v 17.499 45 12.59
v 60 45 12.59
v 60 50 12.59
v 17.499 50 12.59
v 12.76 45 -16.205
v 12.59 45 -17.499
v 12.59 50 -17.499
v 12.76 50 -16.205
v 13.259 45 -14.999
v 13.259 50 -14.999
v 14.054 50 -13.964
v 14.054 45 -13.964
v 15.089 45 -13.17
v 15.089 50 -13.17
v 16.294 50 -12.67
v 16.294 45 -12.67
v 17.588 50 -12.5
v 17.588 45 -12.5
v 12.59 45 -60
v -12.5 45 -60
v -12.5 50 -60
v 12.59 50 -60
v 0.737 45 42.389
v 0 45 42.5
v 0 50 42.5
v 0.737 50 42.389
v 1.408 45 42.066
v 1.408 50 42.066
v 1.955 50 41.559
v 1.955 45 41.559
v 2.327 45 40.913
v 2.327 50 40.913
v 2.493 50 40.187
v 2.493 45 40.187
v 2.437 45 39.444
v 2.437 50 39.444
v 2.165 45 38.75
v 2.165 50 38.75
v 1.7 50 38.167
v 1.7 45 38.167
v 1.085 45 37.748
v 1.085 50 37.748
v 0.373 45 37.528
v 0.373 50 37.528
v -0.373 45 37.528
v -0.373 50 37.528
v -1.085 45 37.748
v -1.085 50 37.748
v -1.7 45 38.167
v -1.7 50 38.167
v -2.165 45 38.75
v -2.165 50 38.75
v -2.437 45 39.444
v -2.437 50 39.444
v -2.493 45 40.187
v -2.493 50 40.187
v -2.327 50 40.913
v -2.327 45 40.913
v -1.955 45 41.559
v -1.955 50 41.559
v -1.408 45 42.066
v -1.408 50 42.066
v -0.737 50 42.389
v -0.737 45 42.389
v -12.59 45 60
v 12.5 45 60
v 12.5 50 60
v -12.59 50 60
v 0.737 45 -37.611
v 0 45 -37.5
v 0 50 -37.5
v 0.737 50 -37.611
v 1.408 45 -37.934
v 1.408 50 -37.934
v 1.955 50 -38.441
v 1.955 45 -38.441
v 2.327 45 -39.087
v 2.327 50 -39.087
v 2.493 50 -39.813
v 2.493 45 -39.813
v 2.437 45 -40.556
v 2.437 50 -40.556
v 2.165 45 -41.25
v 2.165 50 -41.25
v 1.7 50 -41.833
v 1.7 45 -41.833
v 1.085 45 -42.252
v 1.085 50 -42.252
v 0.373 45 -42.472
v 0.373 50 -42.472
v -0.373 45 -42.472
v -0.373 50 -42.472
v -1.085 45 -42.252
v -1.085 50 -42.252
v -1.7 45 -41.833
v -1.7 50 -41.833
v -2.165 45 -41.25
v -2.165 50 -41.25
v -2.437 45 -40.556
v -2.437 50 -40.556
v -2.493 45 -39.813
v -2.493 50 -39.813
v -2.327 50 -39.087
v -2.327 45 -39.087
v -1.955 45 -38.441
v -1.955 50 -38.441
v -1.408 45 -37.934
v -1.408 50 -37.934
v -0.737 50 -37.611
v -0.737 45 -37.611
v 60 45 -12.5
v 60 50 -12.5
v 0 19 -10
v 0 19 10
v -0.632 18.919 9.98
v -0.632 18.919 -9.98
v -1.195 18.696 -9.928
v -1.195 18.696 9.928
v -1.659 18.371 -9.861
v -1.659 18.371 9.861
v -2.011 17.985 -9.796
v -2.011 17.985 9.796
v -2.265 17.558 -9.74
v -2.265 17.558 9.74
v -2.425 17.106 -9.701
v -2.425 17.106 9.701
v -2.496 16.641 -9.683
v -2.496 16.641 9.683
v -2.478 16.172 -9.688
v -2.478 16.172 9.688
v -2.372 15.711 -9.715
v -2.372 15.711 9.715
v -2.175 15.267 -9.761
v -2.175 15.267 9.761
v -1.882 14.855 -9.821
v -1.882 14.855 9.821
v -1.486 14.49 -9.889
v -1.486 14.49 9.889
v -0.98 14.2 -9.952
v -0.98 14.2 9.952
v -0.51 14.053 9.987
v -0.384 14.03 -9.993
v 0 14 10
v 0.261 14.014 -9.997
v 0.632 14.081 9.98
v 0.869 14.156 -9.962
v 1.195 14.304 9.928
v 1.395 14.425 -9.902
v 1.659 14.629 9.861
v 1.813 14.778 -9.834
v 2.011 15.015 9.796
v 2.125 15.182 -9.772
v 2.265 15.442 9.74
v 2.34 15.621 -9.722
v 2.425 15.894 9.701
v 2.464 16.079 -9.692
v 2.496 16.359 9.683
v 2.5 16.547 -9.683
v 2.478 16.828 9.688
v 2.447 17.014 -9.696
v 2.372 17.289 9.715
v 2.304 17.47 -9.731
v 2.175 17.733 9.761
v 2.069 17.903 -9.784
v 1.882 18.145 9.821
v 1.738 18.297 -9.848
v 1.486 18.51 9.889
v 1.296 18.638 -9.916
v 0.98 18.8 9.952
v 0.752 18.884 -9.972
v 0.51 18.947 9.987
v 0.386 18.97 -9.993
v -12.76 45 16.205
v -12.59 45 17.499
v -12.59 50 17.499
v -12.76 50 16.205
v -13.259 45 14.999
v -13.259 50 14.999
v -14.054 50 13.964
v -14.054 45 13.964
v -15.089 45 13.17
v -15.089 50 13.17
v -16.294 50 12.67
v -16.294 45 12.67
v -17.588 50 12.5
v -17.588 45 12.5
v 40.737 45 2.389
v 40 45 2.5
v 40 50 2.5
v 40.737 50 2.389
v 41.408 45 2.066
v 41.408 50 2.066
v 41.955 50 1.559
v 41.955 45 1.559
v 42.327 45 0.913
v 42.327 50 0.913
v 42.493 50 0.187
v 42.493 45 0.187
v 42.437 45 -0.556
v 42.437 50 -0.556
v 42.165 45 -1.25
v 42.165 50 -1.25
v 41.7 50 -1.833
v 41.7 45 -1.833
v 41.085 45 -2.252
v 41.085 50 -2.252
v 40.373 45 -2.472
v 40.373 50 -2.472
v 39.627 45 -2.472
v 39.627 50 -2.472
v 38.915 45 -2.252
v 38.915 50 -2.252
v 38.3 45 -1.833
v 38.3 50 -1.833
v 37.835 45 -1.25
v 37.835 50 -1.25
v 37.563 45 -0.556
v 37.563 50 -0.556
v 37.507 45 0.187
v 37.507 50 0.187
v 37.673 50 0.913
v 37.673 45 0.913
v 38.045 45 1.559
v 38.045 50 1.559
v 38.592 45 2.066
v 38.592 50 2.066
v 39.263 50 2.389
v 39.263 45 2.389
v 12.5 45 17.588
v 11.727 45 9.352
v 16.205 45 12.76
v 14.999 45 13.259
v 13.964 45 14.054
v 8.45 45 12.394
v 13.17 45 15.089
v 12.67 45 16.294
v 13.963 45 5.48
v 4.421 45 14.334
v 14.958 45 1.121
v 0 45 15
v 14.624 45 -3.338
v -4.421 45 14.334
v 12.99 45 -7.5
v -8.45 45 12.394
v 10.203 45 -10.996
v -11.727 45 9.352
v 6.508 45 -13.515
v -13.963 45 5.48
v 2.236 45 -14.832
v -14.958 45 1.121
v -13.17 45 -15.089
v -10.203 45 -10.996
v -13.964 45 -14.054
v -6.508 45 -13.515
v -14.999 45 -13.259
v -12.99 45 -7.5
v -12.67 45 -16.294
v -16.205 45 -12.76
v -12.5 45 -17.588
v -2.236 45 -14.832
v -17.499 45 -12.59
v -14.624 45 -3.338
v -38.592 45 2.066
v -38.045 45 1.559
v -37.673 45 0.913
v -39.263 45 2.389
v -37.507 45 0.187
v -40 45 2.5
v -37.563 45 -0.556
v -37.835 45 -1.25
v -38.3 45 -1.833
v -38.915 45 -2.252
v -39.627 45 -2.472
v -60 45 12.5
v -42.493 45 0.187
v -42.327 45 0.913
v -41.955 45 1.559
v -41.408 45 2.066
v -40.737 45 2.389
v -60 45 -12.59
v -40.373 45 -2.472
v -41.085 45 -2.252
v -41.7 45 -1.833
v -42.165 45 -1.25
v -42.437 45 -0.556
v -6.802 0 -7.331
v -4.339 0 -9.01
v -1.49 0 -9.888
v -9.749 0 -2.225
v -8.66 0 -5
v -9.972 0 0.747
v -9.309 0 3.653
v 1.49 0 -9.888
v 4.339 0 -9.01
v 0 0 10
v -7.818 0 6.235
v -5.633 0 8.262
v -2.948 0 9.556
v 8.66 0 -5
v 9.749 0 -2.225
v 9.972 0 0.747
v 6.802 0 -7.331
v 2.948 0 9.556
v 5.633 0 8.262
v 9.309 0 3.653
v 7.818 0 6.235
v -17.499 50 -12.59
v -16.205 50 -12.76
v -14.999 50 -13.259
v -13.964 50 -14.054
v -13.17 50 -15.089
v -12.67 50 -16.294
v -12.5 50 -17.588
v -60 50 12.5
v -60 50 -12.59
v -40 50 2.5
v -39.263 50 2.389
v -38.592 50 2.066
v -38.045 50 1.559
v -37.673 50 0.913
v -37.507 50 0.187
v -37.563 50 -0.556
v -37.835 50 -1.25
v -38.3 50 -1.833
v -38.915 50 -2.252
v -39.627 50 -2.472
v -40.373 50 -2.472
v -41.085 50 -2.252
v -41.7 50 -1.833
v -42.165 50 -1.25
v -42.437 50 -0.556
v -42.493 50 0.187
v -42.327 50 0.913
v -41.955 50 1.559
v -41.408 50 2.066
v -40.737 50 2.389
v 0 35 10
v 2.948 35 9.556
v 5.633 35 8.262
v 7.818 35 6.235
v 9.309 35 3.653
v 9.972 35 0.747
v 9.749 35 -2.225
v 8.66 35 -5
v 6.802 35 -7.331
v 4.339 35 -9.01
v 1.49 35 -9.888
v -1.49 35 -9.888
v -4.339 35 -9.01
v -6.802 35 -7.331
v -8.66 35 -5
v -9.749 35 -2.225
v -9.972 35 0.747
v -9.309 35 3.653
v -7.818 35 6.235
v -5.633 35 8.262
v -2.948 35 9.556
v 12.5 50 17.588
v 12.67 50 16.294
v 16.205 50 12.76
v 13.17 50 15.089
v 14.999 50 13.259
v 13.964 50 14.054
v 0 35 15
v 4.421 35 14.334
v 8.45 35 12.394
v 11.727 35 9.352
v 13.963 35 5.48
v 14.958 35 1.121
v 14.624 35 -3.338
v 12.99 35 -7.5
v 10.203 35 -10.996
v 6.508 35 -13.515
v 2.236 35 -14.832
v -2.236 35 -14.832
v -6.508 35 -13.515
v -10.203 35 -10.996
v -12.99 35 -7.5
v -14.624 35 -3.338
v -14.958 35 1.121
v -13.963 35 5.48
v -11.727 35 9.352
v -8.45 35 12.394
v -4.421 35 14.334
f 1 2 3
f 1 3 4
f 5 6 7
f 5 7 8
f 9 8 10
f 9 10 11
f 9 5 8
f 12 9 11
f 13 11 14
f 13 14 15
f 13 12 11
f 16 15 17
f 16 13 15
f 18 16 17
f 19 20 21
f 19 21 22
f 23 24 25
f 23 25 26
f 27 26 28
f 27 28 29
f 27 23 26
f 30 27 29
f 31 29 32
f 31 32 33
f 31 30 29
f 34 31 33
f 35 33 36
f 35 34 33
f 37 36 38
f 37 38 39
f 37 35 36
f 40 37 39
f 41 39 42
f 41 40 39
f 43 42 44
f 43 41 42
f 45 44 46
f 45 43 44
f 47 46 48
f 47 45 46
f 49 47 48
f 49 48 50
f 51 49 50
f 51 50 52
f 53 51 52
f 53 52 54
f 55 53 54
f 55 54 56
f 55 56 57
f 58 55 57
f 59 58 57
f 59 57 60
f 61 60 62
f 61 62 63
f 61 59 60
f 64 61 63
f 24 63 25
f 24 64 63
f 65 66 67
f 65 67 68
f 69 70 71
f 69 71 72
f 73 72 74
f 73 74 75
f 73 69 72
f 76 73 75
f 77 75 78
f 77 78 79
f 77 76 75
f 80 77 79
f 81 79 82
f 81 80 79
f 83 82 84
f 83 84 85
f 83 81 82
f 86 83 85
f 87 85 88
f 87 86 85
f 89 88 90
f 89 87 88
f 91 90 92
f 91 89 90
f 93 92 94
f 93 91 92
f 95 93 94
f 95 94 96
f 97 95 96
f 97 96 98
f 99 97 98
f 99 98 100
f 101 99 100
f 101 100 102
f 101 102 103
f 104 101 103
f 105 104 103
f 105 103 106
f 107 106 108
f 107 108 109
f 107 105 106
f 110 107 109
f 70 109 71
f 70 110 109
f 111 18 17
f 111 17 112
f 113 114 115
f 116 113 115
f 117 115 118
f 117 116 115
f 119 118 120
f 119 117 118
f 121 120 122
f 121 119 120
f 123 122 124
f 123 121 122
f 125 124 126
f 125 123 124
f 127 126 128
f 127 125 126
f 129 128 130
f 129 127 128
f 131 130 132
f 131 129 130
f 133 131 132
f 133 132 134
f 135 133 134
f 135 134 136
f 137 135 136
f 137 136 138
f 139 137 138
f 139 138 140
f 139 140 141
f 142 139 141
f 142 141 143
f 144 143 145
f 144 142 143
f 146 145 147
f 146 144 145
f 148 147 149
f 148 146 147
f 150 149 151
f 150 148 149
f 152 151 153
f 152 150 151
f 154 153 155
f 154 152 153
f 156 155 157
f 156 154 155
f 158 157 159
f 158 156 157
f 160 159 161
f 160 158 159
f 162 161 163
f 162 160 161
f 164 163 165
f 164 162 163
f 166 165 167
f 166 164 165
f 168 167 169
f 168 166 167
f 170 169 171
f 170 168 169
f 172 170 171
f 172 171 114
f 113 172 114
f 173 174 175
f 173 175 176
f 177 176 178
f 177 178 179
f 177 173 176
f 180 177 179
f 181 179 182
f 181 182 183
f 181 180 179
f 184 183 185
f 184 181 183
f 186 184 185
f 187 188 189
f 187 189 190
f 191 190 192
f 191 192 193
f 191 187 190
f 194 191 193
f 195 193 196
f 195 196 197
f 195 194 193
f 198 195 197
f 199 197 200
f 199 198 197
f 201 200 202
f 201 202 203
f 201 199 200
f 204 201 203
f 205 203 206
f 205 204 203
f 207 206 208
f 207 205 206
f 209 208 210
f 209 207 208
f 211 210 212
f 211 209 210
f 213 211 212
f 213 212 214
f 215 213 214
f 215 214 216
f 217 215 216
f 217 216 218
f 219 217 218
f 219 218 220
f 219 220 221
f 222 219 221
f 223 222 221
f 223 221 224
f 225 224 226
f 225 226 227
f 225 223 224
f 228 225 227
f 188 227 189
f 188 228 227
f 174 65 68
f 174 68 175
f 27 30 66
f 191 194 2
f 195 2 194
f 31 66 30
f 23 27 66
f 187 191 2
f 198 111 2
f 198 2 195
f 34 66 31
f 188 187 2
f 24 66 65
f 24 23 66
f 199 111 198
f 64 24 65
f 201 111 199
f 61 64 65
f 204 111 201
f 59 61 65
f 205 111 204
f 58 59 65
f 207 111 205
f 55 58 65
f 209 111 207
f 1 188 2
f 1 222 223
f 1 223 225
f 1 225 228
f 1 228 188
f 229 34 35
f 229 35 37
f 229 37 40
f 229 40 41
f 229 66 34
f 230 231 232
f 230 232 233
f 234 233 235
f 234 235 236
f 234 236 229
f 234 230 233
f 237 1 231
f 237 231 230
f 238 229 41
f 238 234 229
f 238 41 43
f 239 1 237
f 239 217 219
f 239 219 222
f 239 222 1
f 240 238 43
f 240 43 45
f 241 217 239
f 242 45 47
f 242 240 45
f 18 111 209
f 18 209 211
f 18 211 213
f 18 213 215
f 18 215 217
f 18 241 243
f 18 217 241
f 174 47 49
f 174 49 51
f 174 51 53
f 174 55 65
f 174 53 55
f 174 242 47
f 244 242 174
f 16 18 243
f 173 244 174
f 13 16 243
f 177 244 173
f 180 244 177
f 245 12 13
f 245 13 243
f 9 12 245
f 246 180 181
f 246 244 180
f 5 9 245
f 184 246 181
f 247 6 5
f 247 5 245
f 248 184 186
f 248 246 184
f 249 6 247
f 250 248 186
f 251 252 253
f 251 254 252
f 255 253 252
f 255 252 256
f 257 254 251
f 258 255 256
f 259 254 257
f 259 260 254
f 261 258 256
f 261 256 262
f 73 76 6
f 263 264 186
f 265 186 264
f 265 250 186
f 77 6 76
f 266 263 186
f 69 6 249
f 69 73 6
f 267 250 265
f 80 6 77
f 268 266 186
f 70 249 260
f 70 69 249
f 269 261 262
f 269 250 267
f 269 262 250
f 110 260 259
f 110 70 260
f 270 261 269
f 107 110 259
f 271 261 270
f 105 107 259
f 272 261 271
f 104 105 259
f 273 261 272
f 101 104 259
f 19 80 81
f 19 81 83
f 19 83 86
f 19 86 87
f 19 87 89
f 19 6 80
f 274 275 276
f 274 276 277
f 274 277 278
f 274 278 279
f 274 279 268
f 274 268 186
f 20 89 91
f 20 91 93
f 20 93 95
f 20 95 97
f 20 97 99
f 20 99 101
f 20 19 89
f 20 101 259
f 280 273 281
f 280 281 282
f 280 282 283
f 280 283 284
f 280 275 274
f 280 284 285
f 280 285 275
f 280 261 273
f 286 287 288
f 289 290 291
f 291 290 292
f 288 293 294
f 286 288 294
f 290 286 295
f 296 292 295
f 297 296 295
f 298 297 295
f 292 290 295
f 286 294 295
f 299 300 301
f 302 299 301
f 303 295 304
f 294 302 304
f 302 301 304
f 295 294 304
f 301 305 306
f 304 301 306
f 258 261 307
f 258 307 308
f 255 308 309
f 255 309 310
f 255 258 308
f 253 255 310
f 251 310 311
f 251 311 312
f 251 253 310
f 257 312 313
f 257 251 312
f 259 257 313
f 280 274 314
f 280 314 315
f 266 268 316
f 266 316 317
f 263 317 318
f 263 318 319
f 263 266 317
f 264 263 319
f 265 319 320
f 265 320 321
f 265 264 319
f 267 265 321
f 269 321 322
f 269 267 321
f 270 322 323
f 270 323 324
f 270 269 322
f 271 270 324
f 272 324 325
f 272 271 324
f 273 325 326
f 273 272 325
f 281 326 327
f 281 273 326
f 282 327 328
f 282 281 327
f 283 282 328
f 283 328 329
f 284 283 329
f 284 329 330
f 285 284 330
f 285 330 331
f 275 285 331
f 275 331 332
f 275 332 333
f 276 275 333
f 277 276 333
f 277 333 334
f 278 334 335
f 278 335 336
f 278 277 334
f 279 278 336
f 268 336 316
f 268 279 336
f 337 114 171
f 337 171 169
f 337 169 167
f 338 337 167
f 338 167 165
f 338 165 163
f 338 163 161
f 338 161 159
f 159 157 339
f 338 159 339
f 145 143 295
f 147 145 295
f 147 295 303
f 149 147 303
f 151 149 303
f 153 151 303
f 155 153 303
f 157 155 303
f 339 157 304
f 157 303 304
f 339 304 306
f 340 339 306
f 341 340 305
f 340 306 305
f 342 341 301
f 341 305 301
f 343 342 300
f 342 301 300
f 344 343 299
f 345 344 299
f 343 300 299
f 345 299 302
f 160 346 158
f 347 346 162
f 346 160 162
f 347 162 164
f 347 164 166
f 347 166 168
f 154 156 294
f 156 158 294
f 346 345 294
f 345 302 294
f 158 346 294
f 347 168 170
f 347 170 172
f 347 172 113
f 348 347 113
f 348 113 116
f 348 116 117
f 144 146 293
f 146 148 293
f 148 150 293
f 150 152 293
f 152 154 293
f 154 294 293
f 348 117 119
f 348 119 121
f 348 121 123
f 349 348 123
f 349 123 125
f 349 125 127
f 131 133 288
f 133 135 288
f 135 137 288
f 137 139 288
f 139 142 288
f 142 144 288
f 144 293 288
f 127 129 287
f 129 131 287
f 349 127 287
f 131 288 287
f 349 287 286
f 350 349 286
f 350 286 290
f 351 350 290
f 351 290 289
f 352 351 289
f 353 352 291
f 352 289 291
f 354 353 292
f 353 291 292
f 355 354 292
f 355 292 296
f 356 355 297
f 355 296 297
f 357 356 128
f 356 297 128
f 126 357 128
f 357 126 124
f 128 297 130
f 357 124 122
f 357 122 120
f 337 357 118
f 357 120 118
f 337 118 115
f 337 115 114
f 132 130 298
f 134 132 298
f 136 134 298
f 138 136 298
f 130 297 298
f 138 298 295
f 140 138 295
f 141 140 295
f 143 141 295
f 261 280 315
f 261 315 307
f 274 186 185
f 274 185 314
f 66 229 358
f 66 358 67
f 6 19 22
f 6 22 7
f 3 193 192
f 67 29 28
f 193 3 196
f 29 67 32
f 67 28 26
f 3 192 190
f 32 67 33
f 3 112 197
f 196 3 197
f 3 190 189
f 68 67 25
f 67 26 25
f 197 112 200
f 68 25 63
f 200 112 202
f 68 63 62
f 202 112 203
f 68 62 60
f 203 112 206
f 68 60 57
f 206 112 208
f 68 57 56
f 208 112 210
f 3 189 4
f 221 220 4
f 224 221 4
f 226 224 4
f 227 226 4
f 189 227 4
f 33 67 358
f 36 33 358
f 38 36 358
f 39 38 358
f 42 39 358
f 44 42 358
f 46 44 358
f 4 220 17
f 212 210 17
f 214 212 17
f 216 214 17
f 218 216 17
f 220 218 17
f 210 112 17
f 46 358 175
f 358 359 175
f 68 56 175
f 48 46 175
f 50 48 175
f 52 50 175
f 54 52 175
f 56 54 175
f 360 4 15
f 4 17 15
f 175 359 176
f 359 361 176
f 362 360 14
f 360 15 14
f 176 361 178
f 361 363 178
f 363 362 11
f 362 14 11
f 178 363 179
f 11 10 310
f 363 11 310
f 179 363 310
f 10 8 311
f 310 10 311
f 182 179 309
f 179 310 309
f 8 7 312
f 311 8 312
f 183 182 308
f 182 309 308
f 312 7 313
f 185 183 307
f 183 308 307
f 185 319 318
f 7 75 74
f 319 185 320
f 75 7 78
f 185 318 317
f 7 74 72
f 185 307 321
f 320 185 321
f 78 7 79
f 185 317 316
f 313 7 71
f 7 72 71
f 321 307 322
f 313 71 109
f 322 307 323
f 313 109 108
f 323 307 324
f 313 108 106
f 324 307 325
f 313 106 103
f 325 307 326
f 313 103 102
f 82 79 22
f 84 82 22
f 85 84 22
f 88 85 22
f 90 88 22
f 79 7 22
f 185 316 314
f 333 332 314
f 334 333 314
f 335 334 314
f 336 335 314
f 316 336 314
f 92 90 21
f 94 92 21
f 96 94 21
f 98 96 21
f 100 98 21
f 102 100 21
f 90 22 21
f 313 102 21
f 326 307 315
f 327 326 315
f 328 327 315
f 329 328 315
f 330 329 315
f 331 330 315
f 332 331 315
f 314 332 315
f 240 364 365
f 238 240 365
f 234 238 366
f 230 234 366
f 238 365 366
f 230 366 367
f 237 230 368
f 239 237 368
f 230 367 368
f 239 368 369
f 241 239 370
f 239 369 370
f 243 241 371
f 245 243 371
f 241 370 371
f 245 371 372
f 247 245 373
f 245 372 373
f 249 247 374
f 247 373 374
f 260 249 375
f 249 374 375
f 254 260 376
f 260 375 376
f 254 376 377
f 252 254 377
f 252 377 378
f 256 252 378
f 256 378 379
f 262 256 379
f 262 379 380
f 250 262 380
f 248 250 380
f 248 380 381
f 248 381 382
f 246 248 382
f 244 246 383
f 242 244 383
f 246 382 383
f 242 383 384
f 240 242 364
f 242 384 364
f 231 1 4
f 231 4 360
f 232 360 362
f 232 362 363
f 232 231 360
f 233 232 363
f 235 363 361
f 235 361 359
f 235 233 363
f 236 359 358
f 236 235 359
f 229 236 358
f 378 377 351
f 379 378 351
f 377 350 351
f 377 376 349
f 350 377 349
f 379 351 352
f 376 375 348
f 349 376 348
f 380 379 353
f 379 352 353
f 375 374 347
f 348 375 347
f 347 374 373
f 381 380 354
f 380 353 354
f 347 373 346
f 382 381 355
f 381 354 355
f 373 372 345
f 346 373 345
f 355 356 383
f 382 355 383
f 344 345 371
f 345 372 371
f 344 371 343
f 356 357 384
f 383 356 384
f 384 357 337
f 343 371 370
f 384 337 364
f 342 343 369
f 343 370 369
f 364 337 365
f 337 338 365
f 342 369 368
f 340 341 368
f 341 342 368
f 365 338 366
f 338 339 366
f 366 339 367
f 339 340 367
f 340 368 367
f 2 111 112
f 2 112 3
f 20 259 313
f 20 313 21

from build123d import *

# Parameters (mm, degrees)
SKETCH1_R               = 10
BOSS_EXTRUDE1_DEPTH     = 35
SKETCH2_R               = 15
BOSS_EXTRUDE2_DEPTH     = 10
SKETCH3_R               = 2.5
BOSS_EXTRUDE3_DEPTH     = 5
CUT_EXTRUDE1_DEPTH      = 50
CUT_EXTRUDE1_DEPTH_BACK = 26
SKETCH7_R               = 2.5


with BuildPart() as part:
    # Sketch1 → Boss-Extrude1 (new body)
    with BuildSketch(Plane(origin=(0, 0, 0), x_dir=(1, 0, 0), z_dir=(0, 1, 0))):
        with Locations(Location((0, 0, 0), (0, 0, 270))):
            Circle(SKETCH1_R)
    extrude(amount=BOSS_EXTRUDE1_DEPTH)

    # Sketch2 → Boss-Extrude2 (add)
    with BuildSketch(Plane(origin=(0, 35, 0), x_dir=(1, 0, 0), z_dir=(0, 1, 0))):
        with Locations(Location((0, 0, 0), (0, 0, 270))):
            Circle(SKETCH2_R)
    extrude(amount=BOSS_EXTRUDE2_DEPTH)

    # Sketch3 → Boss-Extrude3 (add)
    with BuildSketch(Plane(origin=(0, 45, 0), x_dir=(1, 0, 0), z_dir=(0, 1, 0))):
        with BuildLine():
            Line((-60, 0), (-60, 12.589573297))
            Line((-60, 12.589573297), (-17.498503567, 12.589573297))
            ThreePointArc((-17.498503567, 12.589573297), (-13.964027799, 14.053601095), (-12.5, 17.588076863))
            Line((-12.5, 17.588076863), (-12.5, 60))
            Line((-12.5, 60), (12.589573297, 60))
            Line((12.589573297, 60), (12.589573297, 17.498503567))
            ThreePointArc((12.589573297, 17.498503567), (14.053601095, 13.964027799), (17.588076863, 12.5))
            Line((17.588076863, 12.5), (60, 12.5))
            Line((60, 12.5), (60, -12.589573297))
            Line((60, -12.589573297), (17.498503567, -12.589573297))
            ThreePointArc((17.498503567, -12.589573297), (13.964027799, -14.053601095), (12.5, -17.588076863))
            Line((12.5, -17.588076863), (12.5, -60))
            Line((12.5, -60), (-12.589573297, -60))
            Line((-12.589573297, -60), (-12.589573297, -17.498503567))
            ThreePointArc((-12.589573297, -17.498503567), (-14.053601095, -13.964027799), (-17.588076863, -12.5))
            Line((-17.588076863, -12.5), (-60, -12.5))
            Line((-60, -12.5), (-60, 0))
        make_face()
        with Locations(Location((0, 40, 0), (0, 0, 270))):
            Circle(SKETCH3_R, mode=Mode.SUBTRACT)
        with Locations(Location((40, 0, 0), (0, 0, 270))):
            Circle(SKETCH3_R, mode=Mode.SUBTRACT)
        with Locations(Location((0, -40, 0), (0, 0, 270))):
            Circle(SKETCH3_R, mode=Mode.SUBTRACT)
        with Locations(Location((-40, 0, 0), (0, 0, 270))):
            Circle(SKETCH3_R, mode=Mode.SUBTRACT)
    extrude(amount=BOSS_EXTRUDE3_DEPTH)

    # Sketch7 → Cut-Extrude1 (cut, two sides: drawn at the far end of the back side and taken through both)
    with BuildSketch(Plane.XY.offset(-CUT_EXTRUDE1_DEPTH_BACK)):
        with Locations(Location((0, 16.5, 0), (0, 0, 90.000000004))):
            Circle(SKETCH7_R)
    extrude(amount=CUT_EXTRUDE1_DEPTH + CUT_EXTRUDE1_DEPTH_BACK, mode=Mode.SUBTRACT)


solid = part.part
